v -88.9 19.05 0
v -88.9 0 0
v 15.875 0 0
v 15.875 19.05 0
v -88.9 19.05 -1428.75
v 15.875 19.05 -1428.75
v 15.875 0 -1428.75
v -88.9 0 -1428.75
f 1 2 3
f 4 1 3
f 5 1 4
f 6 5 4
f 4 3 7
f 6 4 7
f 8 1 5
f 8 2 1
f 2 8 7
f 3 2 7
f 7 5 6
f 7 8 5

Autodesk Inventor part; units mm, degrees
ref_plane "YZ Plane" through (0, 0, 0) normal (1, 0, 0) x (0, 1, 0)
ref_plane "XZ Plane" through (0, 0, 0) normal (0, 1, 0) x (-1, 0, 0)
ref_plane "XY Plane" through (0, 0, 0) normal (0, 0, 1) x (1, 0, 0)
sketch "Sketch1" plane through (0, 0, 0) normal (0, 1, 0) x (-1, 0, 0)
  line L0 (0, 0) -> (88.9, 0)
  line L1 (88.9, 0) -> (88.9, -1422.4)
  line L2 (88.9, -1422.4) -> (0, -1422.4)
  line L3 (0, -1422.4) -> (0, 0)
  dimension "d0" = 88.9
  dimension "d1" = 1422.4
extrude "Extrusion1" add sketch "Sketch1" along normal blind 3.175
sketch "Sketch2" plane through (0, 0, 0) normal (1, 0, 0) x (0, 0, -1)
  line L0 (1422.4, 0) -> (0, 0) projected
  line L1 (1422.4, 0) -> (1422.4, 3.175) projected
  line L2 (0, 3.175) -> (1422.4, 3.175) projected
  line L3 (0, 0) -> (0, 3.175) projected
extrude "Extrusion2" add sketch "Sketch2" along normal blind 15.875
sketch "Sketch3" plane through (-88.9, 0, -1422.4) normal (0, 0, -1) x (-1, 0, 0)
  line L0 (0, 0) -> (-104.775, 0) projected
  line L1 (0, 0) -> (0, 3.175) projected
  line L2 (0, 3.175) -> (-104.775, 3.175) projected
  line L3 (-104.775, 0) -> (-104.775, 3.175) projected
  point P0 (-88.9, 0)
extrude "Extrusion3" add sketch "Sketch3" along normal blind 6.35
sketch "Sketch4" plane through (0, 3.175, 0) normal (0, 1, 0) x (1, 0, 0)
  line L0 (-88.9, 0) -> (15.875, 0) projected
  line L1 (15.875, 0) -> (15.875, 1428.75) projected
  line L2 (-88.9, 1428.75) -> (15.875, 1428.75) projected
  line L3 (-88.9, 0) -> (-88.9, 1428.75) projected
  point P0 (0, 0)
extrude "Extrusion4" add sketch "Sketch4" along normal blind 15.875
properties part number "56 in k wool"
